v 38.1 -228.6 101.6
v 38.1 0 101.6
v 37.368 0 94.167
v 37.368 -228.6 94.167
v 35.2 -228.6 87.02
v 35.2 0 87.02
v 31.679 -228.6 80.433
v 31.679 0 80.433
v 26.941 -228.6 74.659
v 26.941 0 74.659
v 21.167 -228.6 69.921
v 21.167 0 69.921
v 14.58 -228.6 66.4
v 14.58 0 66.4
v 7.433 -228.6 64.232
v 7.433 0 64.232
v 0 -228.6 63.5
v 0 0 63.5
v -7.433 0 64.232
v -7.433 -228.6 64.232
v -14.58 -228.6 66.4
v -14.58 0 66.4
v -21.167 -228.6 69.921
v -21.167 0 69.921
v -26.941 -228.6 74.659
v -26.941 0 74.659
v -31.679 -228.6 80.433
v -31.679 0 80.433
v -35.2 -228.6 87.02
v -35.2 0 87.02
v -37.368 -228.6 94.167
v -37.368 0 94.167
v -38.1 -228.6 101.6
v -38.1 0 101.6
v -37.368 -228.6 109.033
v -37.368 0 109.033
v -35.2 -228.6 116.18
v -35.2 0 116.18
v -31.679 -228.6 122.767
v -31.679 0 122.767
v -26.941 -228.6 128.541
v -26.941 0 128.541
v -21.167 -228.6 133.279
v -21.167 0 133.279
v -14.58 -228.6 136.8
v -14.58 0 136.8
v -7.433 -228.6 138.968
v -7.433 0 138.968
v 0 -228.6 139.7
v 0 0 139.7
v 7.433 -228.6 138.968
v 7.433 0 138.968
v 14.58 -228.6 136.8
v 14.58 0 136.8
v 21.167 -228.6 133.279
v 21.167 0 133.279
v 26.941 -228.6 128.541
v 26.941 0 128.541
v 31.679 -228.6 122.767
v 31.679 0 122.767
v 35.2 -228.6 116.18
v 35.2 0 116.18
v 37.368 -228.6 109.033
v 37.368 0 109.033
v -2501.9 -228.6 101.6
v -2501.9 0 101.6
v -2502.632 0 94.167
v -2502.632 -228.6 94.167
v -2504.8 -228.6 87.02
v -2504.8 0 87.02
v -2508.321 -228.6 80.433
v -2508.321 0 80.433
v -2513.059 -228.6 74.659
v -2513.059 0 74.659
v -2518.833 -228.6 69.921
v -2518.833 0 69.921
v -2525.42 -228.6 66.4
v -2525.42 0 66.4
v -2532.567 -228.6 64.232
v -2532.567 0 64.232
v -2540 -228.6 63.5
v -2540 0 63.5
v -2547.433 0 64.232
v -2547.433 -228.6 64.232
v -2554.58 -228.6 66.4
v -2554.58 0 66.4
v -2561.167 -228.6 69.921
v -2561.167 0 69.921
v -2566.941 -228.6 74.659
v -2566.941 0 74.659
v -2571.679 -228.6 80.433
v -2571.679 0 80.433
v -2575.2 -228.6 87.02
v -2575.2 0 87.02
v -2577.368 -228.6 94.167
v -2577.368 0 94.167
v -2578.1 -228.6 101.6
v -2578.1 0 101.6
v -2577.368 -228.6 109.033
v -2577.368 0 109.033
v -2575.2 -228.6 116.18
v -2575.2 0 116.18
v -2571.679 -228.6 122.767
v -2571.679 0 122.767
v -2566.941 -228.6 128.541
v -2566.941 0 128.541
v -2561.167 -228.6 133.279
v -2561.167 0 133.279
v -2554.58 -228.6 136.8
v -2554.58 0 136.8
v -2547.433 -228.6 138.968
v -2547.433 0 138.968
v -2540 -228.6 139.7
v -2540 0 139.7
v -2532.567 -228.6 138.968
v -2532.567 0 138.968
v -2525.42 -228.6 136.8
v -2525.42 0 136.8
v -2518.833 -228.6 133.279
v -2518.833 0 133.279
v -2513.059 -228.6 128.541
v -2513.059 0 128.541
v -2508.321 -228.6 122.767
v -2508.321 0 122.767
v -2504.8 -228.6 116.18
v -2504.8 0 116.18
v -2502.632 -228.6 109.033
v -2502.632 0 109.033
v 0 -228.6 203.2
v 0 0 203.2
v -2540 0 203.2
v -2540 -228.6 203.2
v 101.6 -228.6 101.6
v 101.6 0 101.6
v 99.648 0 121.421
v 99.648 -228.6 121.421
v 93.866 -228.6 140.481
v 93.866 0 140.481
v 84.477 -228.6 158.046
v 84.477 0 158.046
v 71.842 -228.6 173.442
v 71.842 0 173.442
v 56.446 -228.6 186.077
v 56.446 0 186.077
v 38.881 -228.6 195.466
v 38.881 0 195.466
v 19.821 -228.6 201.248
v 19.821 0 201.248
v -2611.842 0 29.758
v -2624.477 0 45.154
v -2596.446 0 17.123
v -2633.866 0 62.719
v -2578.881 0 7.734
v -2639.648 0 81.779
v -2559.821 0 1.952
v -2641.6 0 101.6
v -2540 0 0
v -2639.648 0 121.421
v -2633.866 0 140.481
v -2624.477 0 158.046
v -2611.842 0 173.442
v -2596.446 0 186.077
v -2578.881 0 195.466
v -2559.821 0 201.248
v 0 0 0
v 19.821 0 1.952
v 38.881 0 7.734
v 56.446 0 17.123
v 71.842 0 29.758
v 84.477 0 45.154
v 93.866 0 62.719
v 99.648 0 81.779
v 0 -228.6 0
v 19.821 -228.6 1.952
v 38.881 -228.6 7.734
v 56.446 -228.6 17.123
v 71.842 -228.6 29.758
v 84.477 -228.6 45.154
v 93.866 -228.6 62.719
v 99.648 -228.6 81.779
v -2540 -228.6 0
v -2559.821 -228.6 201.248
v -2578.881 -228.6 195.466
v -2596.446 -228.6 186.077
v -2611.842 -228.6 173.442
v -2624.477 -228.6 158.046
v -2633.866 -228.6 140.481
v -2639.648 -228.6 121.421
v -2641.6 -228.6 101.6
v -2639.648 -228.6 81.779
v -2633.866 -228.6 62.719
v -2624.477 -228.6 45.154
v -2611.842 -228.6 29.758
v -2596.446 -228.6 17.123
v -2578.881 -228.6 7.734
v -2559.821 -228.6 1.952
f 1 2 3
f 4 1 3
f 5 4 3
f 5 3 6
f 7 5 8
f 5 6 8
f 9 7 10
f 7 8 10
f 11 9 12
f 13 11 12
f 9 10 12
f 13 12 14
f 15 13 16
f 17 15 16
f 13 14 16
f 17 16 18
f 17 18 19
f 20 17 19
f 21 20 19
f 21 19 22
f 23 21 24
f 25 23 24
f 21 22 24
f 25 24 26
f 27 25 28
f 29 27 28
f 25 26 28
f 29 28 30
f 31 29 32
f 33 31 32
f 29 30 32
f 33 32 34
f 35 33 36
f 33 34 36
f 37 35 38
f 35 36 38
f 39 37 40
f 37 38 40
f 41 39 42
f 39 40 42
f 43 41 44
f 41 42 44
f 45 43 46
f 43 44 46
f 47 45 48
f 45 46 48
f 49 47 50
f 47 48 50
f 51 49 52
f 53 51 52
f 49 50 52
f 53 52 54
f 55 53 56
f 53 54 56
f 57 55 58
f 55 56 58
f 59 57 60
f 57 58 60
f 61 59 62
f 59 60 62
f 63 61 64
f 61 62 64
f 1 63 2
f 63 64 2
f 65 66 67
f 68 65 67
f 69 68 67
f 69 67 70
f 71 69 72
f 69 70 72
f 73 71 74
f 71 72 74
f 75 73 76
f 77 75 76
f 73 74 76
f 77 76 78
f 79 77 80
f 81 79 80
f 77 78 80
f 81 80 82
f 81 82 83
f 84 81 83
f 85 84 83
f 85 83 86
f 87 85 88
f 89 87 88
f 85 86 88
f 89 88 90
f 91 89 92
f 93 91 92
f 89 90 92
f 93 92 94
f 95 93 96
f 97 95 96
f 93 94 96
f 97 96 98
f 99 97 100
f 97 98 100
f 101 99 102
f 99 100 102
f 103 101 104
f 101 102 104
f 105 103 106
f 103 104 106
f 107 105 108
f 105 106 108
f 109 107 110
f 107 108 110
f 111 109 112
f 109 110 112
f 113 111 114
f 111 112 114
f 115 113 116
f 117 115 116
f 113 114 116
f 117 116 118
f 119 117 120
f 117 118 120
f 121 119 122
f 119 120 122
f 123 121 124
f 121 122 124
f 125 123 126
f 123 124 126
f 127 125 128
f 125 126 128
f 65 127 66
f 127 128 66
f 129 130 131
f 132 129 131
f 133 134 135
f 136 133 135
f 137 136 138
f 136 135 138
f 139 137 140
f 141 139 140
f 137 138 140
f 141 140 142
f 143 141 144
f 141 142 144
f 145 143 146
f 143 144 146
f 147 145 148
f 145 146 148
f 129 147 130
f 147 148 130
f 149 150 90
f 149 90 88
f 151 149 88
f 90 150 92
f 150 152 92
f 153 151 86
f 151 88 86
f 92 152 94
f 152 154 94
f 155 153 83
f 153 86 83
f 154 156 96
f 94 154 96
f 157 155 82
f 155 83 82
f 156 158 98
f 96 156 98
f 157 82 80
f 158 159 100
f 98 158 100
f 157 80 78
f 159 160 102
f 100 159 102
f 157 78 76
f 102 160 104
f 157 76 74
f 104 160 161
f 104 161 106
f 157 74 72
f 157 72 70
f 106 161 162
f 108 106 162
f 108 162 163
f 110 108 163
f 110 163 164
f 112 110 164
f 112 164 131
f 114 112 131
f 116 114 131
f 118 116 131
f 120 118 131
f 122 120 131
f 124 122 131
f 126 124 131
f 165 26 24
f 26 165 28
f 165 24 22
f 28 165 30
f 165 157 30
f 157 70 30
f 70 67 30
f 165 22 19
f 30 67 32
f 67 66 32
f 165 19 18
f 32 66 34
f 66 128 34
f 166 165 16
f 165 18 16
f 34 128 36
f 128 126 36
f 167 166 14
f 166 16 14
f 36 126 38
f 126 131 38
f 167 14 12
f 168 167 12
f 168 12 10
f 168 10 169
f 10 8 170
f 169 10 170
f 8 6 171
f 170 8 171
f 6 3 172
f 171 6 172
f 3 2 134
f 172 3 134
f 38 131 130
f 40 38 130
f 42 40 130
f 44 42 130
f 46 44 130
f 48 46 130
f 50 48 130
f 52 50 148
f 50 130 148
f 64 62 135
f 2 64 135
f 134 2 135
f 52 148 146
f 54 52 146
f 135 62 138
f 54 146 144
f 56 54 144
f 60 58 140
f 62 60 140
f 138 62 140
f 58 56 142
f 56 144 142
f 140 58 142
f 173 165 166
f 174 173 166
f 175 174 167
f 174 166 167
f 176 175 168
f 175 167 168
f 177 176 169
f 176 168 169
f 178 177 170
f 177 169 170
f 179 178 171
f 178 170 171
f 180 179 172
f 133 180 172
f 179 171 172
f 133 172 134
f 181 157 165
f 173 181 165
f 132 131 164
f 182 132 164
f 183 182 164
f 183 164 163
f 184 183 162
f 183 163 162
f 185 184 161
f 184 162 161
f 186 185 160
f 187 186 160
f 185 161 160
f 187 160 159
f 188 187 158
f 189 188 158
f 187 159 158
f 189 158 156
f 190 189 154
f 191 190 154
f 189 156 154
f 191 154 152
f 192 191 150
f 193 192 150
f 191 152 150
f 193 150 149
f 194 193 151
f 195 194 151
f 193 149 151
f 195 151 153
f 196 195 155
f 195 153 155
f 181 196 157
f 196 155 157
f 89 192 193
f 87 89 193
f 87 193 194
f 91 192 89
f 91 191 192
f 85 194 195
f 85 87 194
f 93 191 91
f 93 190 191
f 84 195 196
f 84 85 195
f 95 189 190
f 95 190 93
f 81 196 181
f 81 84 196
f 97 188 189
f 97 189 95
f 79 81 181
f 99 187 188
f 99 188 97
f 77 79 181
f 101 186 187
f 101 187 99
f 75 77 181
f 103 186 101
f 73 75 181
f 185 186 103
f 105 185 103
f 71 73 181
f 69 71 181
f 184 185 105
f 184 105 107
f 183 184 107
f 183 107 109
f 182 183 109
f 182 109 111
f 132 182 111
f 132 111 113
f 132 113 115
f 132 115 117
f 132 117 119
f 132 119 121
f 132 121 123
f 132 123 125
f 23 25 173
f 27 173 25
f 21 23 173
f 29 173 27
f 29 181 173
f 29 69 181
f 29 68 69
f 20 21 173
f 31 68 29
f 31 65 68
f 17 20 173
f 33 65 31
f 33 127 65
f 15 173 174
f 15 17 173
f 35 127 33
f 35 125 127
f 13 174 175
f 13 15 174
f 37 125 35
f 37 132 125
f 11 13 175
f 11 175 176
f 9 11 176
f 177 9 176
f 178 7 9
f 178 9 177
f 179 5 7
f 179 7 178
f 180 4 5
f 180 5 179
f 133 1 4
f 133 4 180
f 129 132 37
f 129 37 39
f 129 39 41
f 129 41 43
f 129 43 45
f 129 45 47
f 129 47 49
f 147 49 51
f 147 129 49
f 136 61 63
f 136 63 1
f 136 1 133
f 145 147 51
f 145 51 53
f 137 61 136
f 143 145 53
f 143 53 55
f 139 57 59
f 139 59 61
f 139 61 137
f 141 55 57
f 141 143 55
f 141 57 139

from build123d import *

# Parameters (mm, degrees)
F1_DEPTH = 228.6


with BuildPart() as f1:
    # F0 (on Front) → F1 (new body)
    with BuildSketch(Plane.XZ):
        with BuildLine():
            ThreePointArc((0, 203.2), (-101.6, 101.6), (0, 0))
            Line((0, 0), (0, 63.5))
            ThreePointArc((0, 63.5), (-38.1, 101.6), (0, 139.7))
            Line((0, 139.7), (0, 203.2))
        make_face()
        with BuildLine():
            Line((-2540, 0), (0, 0))
            ThreePointArc((0, 0), (-101.6, 101.6), (0, 203.2))
            Line((0, 203.2), (-2540, 203.2))
            ThreePointArc((-2540, 203.2), (-2468.1579510314, 173.4420489686), (-2438.4, 101.6))
            ThreePointArc((-2438.4, 101.6), (-2468.1579510314, 29.7579510314), (-2540, 0))
        make_face()
        with BuildLine():
            Line((0, 63.5), (0, 0))
            ThreePointArc((0, 0), (71.8420489686, 29.7579510314), (101.6, 101.6))
            ThreePointArc((101.6, 101.6), (71.8420489686, 173.4420489686), (0, 203.2))
            Line((0, 203.2), (0, 139.7))
            ThreePointArc((0, 139.7), (26.9407683632, 128.5407683632), (38.1, 101.6))
            ThreePointArc((38.1, 101.6), (26.9407683632, 74.6592316368), (0, 63.5))
        make_face()
        with BuildLine():
            ThreePointArc((-2540, 203.2), (-2641.6, 101.6), (-2540, 0))
            Line((-2540, 0), (-2540, 63.5))
            ThreePointArc((-2540, 63.5), (-2578.1, 101.6), (-2540, 139.7))
            Line((-2540, 139.7), (-2540, 203.2))
        make_face()
        with BuildLine():
            Line((-2540, 63.5), (-2540, 0))
            ThreePointArc((-2540, 0), (-2468.1579510314, 29.7579510314), (-2438.4, 101.6))
            ThreePointArc((-2438.4, 101.6), (-2468.1579510314, 173.4420489686), (-2540, 203.2))
            Line((-2540, 203.2), (-2540, 139.7))
            ThreePointArc((-2540, 139.7), (-2513.0592316368, 128.5407683632), (-2501.9, 101.6))
            ThreePointArc((-2501.9, 101.6), (-2513.0592316368, 74.6592316368), (-2540, 63.5))
        make_face()
    extrude(amount=F1_DEPTH)


solid = f1.part
